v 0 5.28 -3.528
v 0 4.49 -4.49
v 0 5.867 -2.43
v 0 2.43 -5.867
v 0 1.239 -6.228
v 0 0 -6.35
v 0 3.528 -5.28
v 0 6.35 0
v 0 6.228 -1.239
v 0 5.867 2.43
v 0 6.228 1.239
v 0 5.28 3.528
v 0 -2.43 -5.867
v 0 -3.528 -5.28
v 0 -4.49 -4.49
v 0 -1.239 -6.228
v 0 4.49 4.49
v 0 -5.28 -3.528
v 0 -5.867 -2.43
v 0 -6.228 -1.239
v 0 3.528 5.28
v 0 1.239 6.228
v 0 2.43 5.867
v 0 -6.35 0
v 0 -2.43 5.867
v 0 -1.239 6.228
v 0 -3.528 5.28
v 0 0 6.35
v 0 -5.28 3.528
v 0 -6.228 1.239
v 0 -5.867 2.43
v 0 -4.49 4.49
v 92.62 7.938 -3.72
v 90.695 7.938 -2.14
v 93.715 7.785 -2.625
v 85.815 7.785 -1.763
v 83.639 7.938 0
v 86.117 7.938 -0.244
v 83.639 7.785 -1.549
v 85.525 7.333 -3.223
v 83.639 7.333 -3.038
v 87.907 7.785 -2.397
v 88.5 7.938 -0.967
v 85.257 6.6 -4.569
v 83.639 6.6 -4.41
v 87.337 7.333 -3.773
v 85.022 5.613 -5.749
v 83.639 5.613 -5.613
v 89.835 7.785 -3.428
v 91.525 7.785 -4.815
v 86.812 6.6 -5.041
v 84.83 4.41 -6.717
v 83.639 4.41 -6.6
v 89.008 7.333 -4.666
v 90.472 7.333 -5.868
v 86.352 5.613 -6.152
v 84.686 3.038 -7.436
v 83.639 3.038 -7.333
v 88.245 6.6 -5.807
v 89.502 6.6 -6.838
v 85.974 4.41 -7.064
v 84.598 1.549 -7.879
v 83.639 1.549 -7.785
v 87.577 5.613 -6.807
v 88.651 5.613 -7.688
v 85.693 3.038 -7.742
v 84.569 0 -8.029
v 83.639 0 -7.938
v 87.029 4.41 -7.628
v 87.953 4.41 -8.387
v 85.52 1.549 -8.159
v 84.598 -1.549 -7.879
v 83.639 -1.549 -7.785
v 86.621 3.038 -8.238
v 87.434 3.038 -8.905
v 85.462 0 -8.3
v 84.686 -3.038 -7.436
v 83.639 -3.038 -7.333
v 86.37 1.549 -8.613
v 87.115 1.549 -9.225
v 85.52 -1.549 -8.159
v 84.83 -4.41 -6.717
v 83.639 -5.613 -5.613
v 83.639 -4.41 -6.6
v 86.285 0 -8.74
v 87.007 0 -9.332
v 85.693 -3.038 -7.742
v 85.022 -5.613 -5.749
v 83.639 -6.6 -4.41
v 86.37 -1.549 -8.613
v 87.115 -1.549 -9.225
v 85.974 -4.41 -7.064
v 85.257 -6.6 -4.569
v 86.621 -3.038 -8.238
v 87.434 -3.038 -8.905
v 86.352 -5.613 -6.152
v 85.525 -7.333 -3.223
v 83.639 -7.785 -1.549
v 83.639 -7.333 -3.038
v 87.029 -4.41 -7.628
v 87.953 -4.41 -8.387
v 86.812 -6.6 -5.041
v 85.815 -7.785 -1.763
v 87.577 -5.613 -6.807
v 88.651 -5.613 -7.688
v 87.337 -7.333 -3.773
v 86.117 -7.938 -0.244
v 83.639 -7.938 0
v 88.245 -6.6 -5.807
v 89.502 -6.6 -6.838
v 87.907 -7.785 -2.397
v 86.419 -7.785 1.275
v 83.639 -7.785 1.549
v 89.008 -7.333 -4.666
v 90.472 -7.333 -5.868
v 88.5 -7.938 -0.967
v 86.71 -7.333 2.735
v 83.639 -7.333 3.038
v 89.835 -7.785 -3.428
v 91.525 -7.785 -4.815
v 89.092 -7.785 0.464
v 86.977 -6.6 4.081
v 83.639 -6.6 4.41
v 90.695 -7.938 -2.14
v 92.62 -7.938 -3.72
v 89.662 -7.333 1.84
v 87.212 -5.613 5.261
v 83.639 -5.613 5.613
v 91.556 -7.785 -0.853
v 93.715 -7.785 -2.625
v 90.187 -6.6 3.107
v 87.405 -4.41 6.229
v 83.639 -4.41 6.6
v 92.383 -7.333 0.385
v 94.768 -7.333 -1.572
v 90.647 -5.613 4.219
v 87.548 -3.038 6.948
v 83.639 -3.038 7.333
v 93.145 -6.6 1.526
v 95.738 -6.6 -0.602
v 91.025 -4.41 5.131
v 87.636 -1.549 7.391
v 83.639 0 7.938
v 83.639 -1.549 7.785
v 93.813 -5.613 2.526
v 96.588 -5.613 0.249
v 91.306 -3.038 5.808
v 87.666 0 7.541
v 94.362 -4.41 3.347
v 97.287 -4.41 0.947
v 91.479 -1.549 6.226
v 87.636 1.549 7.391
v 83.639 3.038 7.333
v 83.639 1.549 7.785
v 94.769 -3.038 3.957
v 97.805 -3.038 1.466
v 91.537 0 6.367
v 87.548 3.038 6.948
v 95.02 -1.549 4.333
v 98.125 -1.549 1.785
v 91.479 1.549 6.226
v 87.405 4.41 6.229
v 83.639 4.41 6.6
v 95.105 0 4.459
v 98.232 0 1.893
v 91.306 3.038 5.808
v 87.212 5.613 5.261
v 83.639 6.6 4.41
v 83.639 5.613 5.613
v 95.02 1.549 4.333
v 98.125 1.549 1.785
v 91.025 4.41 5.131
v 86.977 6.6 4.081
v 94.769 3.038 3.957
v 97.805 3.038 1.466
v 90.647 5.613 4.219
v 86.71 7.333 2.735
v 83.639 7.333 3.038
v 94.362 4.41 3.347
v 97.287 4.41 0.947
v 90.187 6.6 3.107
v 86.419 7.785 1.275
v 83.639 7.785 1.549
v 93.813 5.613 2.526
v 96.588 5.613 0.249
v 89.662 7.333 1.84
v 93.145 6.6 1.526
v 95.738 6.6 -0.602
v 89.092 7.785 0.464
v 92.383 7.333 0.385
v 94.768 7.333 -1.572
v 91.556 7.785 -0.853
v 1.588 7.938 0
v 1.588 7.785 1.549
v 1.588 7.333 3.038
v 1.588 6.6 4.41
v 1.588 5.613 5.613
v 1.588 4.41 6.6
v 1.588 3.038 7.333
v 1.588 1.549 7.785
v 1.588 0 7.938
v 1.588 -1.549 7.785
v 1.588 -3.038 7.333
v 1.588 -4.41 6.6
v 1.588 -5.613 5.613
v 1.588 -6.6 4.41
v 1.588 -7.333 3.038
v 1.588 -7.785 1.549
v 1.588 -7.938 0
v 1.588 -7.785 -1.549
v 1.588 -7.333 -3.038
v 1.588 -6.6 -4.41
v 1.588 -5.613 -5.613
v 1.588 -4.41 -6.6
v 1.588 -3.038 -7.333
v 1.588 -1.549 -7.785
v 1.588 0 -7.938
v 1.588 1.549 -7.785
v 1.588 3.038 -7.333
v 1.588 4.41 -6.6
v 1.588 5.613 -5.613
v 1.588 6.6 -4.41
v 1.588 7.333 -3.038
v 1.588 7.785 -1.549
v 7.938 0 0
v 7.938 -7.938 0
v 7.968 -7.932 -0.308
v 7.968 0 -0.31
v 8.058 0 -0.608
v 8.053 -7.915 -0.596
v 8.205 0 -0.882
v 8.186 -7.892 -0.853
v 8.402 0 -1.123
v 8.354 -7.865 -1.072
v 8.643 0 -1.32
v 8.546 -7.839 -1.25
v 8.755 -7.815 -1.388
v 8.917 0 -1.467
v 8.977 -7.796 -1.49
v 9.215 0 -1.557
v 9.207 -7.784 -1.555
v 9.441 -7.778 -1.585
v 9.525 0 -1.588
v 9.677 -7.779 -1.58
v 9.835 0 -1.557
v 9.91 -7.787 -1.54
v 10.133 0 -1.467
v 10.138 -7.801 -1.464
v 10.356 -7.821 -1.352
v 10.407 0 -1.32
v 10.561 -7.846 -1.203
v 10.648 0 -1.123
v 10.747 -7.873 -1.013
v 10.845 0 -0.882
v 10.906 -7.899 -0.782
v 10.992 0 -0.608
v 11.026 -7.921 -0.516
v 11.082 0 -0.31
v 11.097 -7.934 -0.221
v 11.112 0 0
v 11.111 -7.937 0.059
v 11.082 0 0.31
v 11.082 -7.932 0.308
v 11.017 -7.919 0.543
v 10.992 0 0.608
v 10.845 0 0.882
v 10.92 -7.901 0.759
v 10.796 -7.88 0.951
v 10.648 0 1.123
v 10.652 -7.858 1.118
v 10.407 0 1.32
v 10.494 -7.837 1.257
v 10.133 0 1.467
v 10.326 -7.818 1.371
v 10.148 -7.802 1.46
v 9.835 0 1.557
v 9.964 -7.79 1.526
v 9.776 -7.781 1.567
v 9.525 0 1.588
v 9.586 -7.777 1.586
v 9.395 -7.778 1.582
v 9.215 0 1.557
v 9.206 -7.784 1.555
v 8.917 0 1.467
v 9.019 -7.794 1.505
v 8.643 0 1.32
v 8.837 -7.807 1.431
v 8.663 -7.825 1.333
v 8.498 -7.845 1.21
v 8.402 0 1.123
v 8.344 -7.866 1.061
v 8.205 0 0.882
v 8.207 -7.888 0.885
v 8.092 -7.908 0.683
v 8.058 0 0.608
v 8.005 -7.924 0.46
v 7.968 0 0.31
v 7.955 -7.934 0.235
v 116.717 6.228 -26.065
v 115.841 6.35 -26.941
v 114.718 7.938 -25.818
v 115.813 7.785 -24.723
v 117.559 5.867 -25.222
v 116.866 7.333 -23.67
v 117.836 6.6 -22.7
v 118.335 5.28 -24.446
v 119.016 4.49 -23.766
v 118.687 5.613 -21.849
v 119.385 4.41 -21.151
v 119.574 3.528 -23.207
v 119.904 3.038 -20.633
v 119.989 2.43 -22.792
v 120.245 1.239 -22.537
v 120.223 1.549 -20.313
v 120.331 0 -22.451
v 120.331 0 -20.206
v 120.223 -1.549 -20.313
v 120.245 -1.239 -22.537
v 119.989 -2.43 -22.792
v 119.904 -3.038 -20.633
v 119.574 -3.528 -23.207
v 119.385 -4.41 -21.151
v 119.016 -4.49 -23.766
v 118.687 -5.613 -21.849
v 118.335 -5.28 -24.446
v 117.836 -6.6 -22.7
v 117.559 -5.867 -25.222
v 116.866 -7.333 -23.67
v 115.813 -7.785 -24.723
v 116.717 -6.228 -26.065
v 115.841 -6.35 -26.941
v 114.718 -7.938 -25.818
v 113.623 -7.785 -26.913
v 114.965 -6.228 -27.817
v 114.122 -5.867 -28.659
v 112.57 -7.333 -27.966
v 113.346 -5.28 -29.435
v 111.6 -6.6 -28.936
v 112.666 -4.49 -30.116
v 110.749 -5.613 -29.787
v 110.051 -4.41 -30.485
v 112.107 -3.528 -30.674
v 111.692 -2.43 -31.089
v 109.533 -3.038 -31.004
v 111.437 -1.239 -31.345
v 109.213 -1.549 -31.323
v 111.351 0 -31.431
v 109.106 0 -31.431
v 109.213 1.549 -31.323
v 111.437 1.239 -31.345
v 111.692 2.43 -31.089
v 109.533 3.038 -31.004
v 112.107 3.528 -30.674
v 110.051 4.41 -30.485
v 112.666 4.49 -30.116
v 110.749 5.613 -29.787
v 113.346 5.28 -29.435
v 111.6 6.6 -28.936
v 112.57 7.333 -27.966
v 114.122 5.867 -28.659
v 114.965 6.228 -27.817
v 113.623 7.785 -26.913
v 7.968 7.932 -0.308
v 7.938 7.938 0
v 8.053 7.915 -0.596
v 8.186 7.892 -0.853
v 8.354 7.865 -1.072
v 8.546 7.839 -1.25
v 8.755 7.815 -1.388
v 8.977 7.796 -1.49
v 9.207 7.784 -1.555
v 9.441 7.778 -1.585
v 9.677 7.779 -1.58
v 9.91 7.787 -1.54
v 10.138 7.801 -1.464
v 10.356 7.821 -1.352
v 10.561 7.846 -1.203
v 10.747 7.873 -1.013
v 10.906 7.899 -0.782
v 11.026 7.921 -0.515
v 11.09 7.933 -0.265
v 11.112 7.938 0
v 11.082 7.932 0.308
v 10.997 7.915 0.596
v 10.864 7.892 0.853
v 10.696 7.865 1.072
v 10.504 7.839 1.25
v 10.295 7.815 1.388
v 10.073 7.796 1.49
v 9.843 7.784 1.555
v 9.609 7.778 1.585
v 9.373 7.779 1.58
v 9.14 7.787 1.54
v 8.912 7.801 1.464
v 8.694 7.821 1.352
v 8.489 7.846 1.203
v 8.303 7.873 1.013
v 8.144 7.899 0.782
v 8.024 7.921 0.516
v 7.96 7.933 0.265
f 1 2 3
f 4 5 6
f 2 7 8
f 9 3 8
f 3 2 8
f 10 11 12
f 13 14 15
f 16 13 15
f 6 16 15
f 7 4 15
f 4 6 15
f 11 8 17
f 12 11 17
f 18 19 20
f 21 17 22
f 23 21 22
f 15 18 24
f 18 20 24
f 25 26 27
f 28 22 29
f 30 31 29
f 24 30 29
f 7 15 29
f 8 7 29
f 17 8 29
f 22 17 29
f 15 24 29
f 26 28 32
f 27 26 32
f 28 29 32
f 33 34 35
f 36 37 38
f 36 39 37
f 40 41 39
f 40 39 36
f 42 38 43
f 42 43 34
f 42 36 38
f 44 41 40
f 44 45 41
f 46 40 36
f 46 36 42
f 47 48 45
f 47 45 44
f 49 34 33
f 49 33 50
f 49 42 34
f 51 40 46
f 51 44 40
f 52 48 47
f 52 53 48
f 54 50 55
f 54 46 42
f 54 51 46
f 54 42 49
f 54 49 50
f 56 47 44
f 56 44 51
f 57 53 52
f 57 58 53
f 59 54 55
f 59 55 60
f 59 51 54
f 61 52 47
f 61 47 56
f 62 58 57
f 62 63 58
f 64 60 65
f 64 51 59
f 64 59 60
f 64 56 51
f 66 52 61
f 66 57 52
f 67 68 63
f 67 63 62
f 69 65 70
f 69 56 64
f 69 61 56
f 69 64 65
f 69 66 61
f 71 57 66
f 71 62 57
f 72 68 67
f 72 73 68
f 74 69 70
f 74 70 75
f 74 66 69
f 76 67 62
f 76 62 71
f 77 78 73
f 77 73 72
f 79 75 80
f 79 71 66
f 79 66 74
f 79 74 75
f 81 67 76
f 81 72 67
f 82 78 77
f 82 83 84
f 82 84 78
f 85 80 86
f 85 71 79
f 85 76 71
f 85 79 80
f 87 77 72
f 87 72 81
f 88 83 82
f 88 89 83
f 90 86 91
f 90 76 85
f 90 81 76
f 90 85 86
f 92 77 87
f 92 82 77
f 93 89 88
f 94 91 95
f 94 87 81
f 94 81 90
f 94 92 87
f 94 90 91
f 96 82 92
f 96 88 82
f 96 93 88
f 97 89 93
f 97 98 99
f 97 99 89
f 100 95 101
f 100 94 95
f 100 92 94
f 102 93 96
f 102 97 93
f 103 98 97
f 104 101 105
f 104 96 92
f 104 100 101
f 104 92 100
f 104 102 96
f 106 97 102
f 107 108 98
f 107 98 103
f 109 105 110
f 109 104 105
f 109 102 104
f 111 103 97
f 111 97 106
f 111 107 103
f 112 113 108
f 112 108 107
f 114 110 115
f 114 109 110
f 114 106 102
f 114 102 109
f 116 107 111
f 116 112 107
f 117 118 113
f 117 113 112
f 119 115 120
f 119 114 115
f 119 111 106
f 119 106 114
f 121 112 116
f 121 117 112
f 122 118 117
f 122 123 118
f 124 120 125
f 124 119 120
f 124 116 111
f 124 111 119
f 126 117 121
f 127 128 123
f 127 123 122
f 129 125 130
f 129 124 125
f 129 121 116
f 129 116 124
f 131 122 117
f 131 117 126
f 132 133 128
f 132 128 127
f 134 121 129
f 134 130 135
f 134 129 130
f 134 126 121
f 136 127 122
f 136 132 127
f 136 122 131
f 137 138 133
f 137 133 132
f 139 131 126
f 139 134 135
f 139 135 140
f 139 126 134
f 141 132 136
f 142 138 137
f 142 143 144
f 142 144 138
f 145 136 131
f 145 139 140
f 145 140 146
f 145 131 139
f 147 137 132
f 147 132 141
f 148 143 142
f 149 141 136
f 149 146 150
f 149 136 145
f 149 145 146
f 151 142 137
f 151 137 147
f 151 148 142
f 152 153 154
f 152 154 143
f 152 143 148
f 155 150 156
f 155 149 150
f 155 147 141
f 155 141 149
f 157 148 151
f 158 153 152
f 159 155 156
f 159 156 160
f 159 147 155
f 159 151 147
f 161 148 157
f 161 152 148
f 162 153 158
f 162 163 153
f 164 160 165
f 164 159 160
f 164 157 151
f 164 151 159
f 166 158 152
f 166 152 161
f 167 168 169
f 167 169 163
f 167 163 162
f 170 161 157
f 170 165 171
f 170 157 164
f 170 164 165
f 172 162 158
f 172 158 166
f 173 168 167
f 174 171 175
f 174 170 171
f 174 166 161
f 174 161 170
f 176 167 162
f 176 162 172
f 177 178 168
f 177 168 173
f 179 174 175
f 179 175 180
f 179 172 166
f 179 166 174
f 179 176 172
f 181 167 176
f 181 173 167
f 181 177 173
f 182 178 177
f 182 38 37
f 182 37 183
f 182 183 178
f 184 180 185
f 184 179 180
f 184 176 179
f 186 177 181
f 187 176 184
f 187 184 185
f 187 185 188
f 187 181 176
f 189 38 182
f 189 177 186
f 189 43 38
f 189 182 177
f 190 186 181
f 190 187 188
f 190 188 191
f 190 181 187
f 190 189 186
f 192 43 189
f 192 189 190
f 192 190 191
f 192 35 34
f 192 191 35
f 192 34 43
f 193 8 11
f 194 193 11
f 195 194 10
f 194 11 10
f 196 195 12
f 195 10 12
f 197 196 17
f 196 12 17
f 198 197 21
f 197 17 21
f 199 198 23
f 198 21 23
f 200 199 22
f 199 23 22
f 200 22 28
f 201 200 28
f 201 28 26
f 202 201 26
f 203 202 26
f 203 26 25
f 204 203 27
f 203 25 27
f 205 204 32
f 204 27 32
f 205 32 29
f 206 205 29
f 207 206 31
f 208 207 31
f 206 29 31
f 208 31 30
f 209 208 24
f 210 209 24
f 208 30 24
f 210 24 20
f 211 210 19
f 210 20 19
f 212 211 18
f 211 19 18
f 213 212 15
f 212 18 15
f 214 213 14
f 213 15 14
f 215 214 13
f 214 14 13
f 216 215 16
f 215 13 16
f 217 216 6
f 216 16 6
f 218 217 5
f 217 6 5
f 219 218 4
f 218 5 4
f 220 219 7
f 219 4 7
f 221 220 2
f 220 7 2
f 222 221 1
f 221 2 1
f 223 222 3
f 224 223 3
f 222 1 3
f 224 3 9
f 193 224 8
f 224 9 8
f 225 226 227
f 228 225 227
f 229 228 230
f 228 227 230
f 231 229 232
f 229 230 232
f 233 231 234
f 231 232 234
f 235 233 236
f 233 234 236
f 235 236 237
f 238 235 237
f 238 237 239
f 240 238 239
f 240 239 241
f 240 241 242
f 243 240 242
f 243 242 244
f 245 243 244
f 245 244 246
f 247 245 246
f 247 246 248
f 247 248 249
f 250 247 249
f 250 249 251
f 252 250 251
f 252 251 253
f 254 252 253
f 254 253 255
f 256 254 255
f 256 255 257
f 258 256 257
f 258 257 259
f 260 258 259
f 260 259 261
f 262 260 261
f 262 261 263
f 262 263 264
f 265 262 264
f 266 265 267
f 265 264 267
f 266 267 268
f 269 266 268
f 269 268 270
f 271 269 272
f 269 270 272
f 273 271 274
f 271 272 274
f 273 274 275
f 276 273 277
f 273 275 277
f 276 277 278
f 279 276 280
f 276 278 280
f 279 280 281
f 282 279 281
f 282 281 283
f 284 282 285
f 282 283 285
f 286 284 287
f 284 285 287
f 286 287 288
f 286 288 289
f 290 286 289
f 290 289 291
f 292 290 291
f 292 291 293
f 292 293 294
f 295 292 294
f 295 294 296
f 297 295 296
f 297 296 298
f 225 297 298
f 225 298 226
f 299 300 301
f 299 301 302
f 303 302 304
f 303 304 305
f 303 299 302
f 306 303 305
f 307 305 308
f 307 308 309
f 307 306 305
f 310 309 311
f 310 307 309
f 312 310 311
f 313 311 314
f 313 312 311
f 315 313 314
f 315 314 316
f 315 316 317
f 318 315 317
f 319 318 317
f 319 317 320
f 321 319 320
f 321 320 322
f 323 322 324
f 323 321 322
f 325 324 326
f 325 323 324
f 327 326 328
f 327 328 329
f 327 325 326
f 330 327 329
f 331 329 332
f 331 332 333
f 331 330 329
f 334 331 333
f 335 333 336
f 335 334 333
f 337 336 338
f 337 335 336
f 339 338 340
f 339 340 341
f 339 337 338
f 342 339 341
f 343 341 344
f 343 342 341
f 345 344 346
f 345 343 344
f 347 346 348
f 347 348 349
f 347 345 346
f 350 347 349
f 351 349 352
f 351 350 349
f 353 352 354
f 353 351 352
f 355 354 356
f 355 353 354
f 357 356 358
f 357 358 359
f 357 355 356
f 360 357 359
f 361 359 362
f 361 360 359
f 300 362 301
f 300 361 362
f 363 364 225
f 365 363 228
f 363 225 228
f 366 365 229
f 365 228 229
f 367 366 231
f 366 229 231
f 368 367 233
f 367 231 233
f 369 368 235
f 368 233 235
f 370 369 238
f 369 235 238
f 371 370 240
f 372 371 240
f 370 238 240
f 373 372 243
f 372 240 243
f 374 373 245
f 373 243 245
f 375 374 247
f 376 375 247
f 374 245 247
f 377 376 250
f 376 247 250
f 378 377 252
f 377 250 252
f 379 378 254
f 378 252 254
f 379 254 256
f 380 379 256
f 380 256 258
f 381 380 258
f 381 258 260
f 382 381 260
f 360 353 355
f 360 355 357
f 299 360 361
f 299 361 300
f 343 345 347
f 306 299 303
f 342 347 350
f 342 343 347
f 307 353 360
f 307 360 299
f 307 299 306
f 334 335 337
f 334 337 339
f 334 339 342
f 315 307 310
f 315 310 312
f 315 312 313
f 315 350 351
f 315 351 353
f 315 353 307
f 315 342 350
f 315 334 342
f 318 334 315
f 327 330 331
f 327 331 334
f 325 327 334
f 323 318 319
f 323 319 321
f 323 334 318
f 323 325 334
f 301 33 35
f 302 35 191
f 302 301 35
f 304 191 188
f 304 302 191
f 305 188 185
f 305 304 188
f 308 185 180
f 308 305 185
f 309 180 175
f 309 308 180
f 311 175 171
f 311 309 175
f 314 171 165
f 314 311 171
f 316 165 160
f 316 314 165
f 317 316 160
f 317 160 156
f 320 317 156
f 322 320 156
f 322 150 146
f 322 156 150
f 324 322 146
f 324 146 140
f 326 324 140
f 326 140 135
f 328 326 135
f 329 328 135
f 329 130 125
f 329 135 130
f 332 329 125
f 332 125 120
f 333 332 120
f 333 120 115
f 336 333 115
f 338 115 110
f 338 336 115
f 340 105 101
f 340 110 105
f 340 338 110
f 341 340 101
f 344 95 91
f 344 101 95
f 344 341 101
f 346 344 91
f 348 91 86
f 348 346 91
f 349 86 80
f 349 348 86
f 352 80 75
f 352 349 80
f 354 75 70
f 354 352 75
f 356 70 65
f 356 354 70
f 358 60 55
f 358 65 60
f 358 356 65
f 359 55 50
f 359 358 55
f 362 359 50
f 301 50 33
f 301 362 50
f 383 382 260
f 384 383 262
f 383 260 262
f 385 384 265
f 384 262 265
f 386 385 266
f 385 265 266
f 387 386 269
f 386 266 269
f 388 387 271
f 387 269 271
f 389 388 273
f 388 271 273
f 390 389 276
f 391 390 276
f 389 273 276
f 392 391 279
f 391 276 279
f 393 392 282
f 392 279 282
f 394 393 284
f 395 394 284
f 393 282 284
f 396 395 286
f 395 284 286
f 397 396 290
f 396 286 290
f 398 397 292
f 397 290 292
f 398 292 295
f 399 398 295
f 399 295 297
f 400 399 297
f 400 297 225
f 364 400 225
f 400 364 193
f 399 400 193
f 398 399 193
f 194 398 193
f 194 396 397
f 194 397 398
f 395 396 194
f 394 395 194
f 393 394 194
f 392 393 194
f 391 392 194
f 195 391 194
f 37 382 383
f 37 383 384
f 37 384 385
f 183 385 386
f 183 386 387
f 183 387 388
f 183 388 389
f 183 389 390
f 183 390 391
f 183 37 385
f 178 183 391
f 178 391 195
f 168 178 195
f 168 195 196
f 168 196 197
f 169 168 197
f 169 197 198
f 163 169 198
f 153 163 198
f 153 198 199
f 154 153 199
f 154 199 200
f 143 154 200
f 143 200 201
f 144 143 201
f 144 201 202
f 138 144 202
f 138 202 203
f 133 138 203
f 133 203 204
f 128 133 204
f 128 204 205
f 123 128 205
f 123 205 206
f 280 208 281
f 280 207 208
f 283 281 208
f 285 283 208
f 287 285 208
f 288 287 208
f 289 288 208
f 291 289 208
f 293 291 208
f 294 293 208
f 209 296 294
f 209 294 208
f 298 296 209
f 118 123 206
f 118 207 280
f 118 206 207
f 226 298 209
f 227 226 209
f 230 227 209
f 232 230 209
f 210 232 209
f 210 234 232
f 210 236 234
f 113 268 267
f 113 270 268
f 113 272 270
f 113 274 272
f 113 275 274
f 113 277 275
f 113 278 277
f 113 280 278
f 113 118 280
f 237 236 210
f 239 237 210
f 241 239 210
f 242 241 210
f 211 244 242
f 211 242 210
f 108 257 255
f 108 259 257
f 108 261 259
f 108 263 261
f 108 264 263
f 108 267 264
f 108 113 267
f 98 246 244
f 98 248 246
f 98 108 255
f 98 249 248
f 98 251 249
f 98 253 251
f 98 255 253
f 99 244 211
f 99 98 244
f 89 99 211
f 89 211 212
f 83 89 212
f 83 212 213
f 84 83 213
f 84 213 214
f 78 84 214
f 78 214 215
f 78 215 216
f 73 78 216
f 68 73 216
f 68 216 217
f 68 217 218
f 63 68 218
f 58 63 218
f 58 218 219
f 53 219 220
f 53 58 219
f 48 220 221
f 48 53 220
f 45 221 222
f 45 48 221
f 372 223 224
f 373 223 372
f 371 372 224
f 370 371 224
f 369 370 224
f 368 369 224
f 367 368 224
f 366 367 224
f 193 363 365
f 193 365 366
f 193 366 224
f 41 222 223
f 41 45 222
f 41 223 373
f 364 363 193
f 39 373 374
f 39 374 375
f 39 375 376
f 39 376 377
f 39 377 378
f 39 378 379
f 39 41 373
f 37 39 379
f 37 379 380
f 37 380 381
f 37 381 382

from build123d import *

# Parameters (mm, degrees)
F1_R     = 7.9375
F4_D     = 3.175
F4_DEPTH = 7.9385001
F5_D     = 3.175
F6_SIZE  = 1.5875


with BuildPart() as f2:
    # F2: sweep along a path in F0
    with BuildLine(Plane.XZ) as f2_path:
        Line((0, 0), (83.6394877579, 0))
        ThreePointArc((83.6394877579, 0), (88.4995673489, -0.9667299371), (92.6197438789, -3.7197438789))
        Line((92.6197438789, -3.7197438789), (115.8407683632, -26.9407683632))
    # F1 (on Right) → F2 (sweep)
    with BuildSketch(Plane.YZ):
        Circle(F1_R)
    sweep(path=f2_path.line)

    # F4 (through all, one way)
    with BuildSketch(Plane.XZ):
        with Locations((9.525, 0)):
            Circle(F4_D / 2)
    extrude(amount=-F4_DEPTH, mode=Mode.SUBTRACT)

    # F5 (through all)
    with Locations(Plane(origin=(0, 0, 0), x_dir=(1, 0, 0), z_dir=(0, 1, 0))):
        with Locations((9.525, 0)):
            Hole(F5_D / 2)

    # F6
    f6_edges = [f2.edges().sort_by_distance(p)[0] for p in [
        (0, -7.9375, 0),
        (115.840768, -7.9375, -26.940768),
    ]]
    chamfer(f6_edges, length=F6_SIZE)


solid = f2.part
